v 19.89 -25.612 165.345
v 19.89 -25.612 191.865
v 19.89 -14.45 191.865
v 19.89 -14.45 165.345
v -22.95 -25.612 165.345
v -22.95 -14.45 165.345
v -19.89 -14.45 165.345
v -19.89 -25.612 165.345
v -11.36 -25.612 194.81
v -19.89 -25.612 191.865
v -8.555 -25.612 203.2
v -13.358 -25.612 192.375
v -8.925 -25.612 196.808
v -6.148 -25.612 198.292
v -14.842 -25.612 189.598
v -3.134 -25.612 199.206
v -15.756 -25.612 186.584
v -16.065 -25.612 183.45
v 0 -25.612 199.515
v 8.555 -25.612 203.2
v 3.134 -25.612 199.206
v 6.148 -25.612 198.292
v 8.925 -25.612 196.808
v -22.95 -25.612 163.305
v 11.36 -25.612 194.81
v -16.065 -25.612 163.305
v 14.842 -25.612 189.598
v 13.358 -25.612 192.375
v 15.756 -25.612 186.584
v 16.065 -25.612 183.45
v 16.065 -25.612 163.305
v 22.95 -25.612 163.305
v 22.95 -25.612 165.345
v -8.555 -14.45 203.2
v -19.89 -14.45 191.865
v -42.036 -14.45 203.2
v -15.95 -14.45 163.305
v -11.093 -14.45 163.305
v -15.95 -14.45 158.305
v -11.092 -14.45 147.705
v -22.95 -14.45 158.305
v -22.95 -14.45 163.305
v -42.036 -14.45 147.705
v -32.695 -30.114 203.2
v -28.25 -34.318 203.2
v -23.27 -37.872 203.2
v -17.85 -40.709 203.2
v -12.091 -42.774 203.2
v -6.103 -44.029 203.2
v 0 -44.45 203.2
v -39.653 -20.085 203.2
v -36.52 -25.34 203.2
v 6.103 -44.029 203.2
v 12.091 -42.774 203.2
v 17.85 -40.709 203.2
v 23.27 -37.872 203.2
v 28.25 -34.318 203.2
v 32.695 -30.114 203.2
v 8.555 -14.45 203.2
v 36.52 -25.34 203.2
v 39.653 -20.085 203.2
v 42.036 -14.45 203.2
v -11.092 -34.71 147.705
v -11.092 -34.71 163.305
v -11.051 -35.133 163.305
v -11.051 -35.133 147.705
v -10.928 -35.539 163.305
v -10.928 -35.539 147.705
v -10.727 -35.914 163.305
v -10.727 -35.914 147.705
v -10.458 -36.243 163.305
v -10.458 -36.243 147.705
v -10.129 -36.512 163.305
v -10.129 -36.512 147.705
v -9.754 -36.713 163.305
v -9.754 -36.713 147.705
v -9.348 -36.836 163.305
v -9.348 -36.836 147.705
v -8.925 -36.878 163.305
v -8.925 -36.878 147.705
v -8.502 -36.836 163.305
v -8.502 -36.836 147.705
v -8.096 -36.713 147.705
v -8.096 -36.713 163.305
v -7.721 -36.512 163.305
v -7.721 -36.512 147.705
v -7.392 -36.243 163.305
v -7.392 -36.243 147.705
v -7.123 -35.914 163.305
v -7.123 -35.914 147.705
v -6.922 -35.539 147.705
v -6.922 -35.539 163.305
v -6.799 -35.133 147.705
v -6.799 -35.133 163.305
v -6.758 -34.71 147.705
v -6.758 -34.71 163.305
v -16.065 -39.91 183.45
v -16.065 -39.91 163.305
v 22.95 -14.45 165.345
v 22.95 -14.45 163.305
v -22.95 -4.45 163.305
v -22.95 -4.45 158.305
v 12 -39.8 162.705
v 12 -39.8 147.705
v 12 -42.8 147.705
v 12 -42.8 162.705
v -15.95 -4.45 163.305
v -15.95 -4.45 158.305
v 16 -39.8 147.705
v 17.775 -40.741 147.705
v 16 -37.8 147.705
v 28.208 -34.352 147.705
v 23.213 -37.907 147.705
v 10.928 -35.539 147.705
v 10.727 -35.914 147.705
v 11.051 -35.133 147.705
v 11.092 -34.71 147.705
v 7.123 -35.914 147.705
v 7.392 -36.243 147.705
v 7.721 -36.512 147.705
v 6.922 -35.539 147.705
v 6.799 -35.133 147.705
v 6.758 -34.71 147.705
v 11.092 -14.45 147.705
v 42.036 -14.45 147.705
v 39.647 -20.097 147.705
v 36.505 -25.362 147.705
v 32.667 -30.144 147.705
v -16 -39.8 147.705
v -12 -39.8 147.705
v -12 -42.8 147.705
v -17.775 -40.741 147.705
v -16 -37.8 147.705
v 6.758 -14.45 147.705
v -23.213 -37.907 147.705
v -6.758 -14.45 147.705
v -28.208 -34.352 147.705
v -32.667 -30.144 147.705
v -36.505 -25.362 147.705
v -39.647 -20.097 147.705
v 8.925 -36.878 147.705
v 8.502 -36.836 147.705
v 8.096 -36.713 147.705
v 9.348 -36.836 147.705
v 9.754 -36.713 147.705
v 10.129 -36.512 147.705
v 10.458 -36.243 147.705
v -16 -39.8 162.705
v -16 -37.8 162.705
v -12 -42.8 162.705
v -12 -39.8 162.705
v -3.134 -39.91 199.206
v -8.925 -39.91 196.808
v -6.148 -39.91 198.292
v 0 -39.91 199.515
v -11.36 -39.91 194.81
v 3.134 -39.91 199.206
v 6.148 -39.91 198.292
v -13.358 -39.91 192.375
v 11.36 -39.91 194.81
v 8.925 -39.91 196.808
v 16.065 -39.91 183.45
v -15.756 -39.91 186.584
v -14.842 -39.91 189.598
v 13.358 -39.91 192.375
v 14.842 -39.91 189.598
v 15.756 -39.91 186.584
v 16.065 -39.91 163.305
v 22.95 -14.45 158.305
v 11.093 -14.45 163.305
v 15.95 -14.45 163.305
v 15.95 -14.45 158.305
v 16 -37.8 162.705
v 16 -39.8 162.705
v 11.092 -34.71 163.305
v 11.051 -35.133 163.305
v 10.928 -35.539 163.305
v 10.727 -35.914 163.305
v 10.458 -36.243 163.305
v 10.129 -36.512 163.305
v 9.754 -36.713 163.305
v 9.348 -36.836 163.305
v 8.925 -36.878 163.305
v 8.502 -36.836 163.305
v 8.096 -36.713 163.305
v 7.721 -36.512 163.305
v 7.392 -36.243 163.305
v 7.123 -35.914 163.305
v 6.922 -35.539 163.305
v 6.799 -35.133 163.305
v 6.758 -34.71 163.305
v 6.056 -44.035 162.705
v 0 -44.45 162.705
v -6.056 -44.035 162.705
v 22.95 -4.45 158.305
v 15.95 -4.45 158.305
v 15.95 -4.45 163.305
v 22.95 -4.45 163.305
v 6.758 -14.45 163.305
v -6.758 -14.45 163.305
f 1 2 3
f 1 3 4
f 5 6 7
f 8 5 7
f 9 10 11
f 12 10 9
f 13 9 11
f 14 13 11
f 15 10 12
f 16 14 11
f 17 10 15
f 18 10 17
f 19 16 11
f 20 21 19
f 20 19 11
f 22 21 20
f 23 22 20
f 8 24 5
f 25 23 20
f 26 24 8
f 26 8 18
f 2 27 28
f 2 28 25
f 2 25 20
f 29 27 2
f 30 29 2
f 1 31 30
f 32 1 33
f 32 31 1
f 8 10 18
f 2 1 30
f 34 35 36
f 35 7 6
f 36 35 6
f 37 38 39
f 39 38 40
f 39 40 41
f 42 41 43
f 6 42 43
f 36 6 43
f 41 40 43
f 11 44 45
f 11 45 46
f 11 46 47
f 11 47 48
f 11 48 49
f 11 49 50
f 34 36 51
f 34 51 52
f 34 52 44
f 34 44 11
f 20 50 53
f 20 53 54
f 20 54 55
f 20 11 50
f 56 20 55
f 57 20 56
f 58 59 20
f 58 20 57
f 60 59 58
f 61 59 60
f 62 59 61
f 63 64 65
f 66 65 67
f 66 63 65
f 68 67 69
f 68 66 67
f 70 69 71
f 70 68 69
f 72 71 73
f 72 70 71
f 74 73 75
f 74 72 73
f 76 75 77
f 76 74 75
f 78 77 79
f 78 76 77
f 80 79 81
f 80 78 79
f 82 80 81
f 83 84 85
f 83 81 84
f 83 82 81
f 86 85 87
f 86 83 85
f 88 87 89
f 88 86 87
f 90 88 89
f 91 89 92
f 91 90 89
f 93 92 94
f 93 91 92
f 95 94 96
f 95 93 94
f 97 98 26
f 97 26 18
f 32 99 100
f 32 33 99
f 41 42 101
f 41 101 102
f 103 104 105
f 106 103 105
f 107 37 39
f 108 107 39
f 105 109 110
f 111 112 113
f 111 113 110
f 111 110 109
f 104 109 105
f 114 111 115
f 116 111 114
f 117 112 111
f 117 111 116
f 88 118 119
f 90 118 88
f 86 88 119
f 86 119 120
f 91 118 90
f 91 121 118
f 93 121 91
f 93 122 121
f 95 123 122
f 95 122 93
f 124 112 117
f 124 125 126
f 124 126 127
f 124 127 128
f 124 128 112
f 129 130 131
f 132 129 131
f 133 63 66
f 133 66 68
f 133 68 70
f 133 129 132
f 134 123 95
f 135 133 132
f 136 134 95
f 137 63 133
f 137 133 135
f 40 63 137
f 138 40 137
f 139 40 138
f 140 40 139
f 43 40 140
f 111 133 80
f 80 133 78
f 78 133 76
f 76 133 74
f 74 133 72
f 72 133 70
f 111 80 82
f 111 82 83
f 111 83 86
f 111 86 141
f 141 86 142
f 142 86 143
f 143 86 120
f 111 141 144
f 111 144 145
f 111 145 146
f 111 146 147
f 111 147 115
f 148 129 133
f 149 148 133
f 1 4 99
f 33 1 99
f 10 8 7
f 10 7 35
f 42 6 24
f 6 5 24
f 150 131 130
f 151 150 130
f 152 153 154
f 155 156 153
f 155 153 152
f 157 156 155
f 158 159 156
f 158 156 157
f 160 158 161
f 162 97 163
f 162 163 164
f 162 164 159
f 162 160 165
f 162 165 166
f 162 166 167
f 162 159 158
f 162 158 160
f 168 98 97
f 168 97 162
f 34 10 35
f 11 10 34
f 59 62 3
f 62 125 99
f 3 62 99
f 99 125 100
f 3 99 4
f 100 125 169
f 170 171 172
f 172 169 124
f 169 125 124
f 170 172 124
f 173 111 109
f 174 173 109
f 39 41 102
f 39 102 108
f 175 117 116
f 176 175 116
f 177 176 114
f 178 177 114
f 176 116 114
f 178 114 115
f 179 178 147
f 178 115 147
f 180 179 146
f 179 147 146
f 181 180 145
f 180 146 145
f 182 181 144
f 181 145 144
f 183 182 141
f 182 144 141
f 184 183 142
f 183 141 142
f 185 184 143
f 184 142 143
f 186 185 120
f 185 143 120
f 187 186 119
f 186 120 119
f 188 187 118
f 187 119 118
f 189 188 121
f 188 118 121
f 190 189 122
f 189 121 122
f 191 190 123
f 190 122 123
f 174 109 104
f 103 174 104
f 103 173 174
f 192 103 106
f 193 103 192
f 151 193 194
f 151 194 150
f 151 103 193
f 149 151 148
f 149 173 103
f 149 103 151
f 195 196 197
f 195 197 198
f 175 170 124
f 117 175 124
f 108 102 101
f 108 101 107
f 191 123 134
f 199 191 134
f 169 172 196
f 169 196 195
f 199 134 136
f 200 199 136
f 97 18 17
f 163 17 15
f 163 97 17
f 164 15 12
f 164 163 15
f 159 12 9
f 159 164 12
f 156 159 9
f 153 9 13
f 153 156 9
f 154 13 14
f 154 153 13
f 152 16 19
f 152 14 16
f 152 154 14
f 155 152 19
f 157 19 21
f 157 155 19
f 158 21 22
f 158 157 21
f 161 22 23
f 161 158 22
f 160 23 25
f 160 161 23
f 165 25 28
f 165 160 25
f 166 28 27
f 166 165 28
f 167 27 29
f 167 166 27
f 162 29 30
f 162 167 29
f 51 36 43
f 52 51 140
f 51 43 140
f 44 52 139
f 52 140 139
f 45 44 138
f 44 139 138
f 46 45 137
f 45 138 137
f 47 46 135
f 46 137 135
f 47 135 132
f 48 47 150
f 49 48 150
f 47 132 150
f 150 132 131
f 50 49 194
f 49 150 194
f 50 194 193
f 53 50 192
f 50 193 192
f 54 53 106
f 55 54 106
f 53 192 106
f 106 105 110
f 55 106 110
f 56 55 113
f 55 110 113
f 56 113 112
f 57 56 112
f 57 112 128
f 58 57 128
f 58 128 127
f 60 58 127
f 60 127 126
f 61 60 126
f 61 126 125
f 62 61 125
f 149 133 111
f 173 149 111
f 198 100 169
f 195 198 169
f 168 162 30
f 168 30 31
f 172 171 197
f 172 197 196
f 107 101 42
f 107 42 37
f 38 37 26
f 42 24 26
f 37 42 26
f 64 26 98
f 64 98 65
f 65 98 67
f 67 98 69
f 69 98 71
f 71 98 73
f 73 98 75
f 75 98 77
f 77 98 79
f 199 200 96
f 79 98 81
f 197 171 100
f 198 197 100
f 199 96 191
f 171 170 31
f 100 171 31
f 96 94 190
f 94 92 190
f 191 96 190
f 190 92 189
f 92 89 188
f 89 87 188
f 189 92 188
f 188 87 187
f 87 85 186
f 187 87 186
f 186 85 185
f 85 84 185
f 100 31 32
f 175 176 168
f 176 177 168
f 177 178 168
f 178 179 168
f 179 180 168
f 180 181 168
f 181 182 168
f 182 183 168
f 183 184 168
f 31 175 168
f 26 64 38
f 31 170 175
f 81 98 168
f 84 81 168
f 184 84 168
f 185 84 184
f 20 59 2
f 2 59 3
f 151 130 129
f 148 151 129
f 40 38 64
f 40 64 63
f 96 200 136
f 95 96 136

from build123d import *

# Parameters (mm, degrees)
BOSS_EXTRUDE1_DEPTH = 203.2
CAVITY1_START       = -39.91
CAVITY1_DEPTH       = 23.46
CAVITY1_START_2     = -18.031
CAVITY1_2_OUTLINE_W = 6.885
CAVITY1_2_OUTLINE_H = 2.04
CAVITY1_2_OUTLINE_R = 14.28
CAVITY1_2_DEPTH     = 3.581
CAVITY1_START_3     = -19.612
CAVITY1_3_DEPTH     = 3.162
CAVITY1_START_4     = 132.705
CAVITY1_4_OUTLINE_R = 2.1675
CAVITY1_4_DEPTH     = 32.64
CAVITY1_START_5     = 163.305
CAVITY1_5_DEPTH     = 2.04
CAVITY1_6_OUTLINE_R = 2.1675
CAVITY1_6_DEPTH     = 19.992
CAVITY1_7_OUTLINE_R = 2.1675
CAVITY1_7_DEPTH     = 19.992
CUT_EXTRUDE1_DEPTH  = 210.058488467
CUT_EXTRUDE2_DEPTH  = 209.983650662
SKETCH4_W           = 4.335
SKETCH4_H           = 30.6
CUT_EXTRUDE3_DEPTH  = 209.062749189
CUT_EXTRUDE4_DEPTH  = 132.705
CUT_EXTRUDE5_DEPTH  = 15
CUT_EXTRUDE6_DEPTH  = 6
CUT_EXTRUDE7_REACH  = 84.598
SKETCH8_W           = 7
SKETCH8_H           = 5
BOSS_EXTRUDE2_DEPTH = 10
CUT_EXTRUDE8_DEPTH  = 15


with BuildPart() as part:
    # Sketch1 → Boss-Extrude1 (new body)
    with BuildSketch(Plane.XY):
        with BuildLine():
            Line((42.035699114, -14.45), (-42.035699114, -14.45))
            ThreePointArc((-42.035699114, -14.45), (0, -44.45), (42.035699114, -14.45))
        make_face()
    extrude(amount=BOSS_EXTRUDE1_DEPTH)

    # Cavity1: read off the stored shape, not the designer's step
    # Cavity1 outline → Cavity1 (cut)
    with BuildSketch(Plane(origin=(0, 0, 0), x_dir=(1, 0, 0), z_dir=(0, 1, 0)).offset(CAVITY1_START)):
        with BuildLine():
            Line((16.065, -165.345), (16.065, -163.305))
            Line((16.065, -163.305), (-16.065, -163.305))
            Line((-16.065, -163.305), (-16.065, -165.345))
            Line((-16.065, -165.345), (-16.065, -183.45))
            ThreePointArc((-16.065, -183.45), (0, -199.515), (16.065, -183.45))
            Line((16.065, -183.45), (16.065, -165.345))
        make_face()
    extrude(amount=CAVITY1_DEPTH, mode=Mode.SUBTRACT)

    # Cavity1 2 outline → Cavity1 2 (cut)
    with BuildSketch(Plane(origin=(0, 0, 0), x_dir=(1, 0, 0), z_dir=(0, 1, 0)).offset(CAVITY1_START_2)):
        with Locations((19.5075, -164.325)):
            Rectangle(CAVITY1_2_OUTLINE_W, CAVITY1_2_OUTLINE_H)
        with Locations((-19.5075, -164.325)):
            Rectangle(CAVITY1_2_OUTLINE_W, CAVITY1_2_OUTLINE_H)
        with Locations((0, -183.45)):
            Circle(CAVITY1_2_OUTLINE_R)
    extrude(amount=CAVITY1_2_DEPTH, mode=Mode.SUBTRACT)

    # Cavity1 3 outline → Cavity1 3 (cut)
    with BuildSketch(Plane(origin=(0, 0, 0), x_dir=(1, 0, 0), z_dir=(0, 1, 0)).offset(CAVITY1_START_3)):
        with BuildLine():
            Line((19.89, -163.305), (16.065, -163.305))
            Line((16.065, -163.305), (16.065, -183.45))
            ThreePointArc((16.065, -183.45), (0, -199.515), (-16.065, -183.45))
            Line((-16.065, -183.45), (-16.065, -163.305))
            Line((-16.065, -163.305), (-19.89, -163.305))
            Line((-19.89, -163.305), (-19.89, -191.865))
            Line((-19.89, -191.865), (-8.555, -203.2))
            Line((-8.555, -203.2), (8.555, -203.2))
            Line((8.555, -203.2), (19.89, -191.865))
            Line((19.89, -191.865), (19.89, -163.305))
        make_face()
    extrude(amount=CAVITY1_3_DEPTH, mode=Mode.SUBTRACT)

    # Cavity1 4 outline → Cavity1 4 (cut)
    with BuildSketch(Plane.XY.offset(CAVITY1_START_4)):
        with Locations((8.925, -29.71)):
            Circle(CAVITY1_4_OUTLINE_R)
        with Locations((-8.925, -29.71)):
            Circle(CAVITY1_4_OUTLINE_R)
    extrude(amount=CAVITY1_4_DEPTH, mode=Mode.SUBTRACT)

    # Cavity1 5 outline → Cavity1 5 (cut)
    with BuildSketch(Plane.XY.offset(CAVITY1_START_5)):
        Polygon((9.131481481, -14.45), (7.65, -16.45), (16.065, -16.45), (16.065, -14.45), align=None)
        Polygon((-16.065, -16.45), (-7.65, -16.45), (-9.131481481, -14.45), (-16.065, -14.45), align=None)
    extrude(amount=CAVITY1_5_DEPTH, mode=Mode.SUBTRACT)


with BuildPart() as body_2:
    # Cavity1 6 outline → Cavity1 6 (new body)
    with BuildSketch(Plane.XY.offset(CAVITY1_START_5)):
        with Locations((-8.925, -29.71)):
            Circle(CAVITY1_6_OUTLINE_R)
    extrude(amount=CAVITY1_6_DEPTH)


with BuildPart() as body_3:
    # Cavity1 7 outline → Cavity1 7 (new body)
    with BuildSketch(Plane.XY.offset(CAVITY1_START_5)):
        with Locations((8.925, -29.71)):
            Circle(CAVITY1_7_OUTLINE_R)
    extrude(amount=CAVITY1_7_DEPTH)


with BuildPart() as cut_extrude1_tool:
    # Sketch2 → Cut-Extrude1 (new, through all)
    with BuildSketch(Plane(origin=(0, -39.91, 0), x_dir=(1, 0, 0), z_dir=(0, 1, 0))):
        with BuildLine():
            Line((16.065, -183.45), (16.065, -163.305))
            Line((16.065, -163.305), (-16.065, -163.305))
            Line((-16.065, -163.305), (-16.065, -183.45))
            ThreePointArc((-16.065, -183.45), (0, -199.515), (16.065, -183.45))
        make_face()
    extrude(amount=CUT_EXTRUDE1_DEPTH)


with BuildPart() as part_1:
    add(part.part)

    # Cut-Extrude1: cut by cut_extrude1_tool
    add(cut_extrude1_tool.part, mode=Mode.SUBTRACT)

    # Sketch3 → Cut-Extrude2 (cut, through all)
    with BuildSketch(Plane(origin=(0, -19.612, 0), x_dir=(1, 0, 0), z_dir=(0, 1, 0))):
        with BuildLine():
            Line((-8.555, -203.2), (8.555, -203.2))
            Line((8.555, -203.2), (19.89, -191.865))
            Line((19.89, -191.865), (19.89, -163.305))
            Line((19.89, -163.305), (16.065, -163.305))
            Line((16.065, -163.305), (16.065, -183.45))
            ThreePointArc((16.065, -183.45), (0, -199.515), (-16.065, -183.45))
            Line((-16.065, -183.45), (-16.065, -163.305))
            Line((-16.065, -163.305), (-19.89, -163.305))
            Line((-19.89, -163.305), (-19.89, -191.865))
            Line((-19.89, -191.865), (-8.555, -203.2))
        make_face()
    extrude(amount=CUT_EXTRUDE2_DEPTH, mode=Mode.SUBTRACT)

    # Sketch4 → Cut-Extrude3 (cut, through all)
    with BuildSketch(Plane(origin=(0, -29.71, 0), x_dir=(1, 0, 0), z_dir=(0, 1, 0))):
        with Locations((-8.925, -148.005)):
            Rectangle(SKETCH4_W, SKETCH4_H)
        with Locations((8.925, -148.005)):
            Rectangle(SKETCH4_W, SKETCH4_H)
    extrude(amount=CUT_EXTRUDE3_DEPTH, mode=Mode.SUBTRACT)

    # Sketch1<3> → Cut-Extrude4 (cut)
    with BuildSketch(Plane.XY):
        with BuildLine():
            ThreePointArc((44.45, 0), (-7.325151001, 43.842270274), (-42.035699114, -14.45))
            Line((-42.035699114, -14.45), (42.035699114, -14.45))
            ThreePointArc((42.035699114, -14.45), (43.842270274, -7.325151001), (44.45, 0))
        make_face()
        with BuildLine():
            Line((42.035699114, -14.45), (-42.035699114, -14.45))
            ThreePointArc((-42.035699114, -14.45), (0, -44.45), (42.035699114, -14.45))
        make_face()
    extrude(amount=CUT_EXTRUDE4_DEPTH, mode=Mode.SUBTRACT)

    # Sketch5 → Cut-Extrude5 (cut)
    with BuildSketch(Plane(origin=(0, 0, 132.705), x_dir=(-1, 0, 0), z_dir=(0, 0, -1))):
        with BuildLine():
            Line((6.7575, -29.71), (6.7575, -14.45))
            Line((6.7575, -14.45), (-6.7575, -14.45))
            Line((-6.7575, -14.45), (-6.7575, -29.71))
            ThreePointArc((-6.7575, -29.71), (-8.925, -31.8775), (-11.0925, -29.71))
            Line((-11.0925, -29.71), (-11.0925, -14.45))
            Line((-11.0925, -14.45), (-42.035699114, -14.45))
            ThreePointArc((-42.035699114, -14.45), (0, -44.45), (42.035699114, -14.45))
            Line((42.035699114, -14.45), (11.0925, -14.45))
            Line((11.0925, -14.45), (11.0925, -29.71))
            ThreePointArc((11.0925, -29.71), (8.925, -31.8775), (6.7575, -29.71))
        make_face()
    extrude(amount=-CUT_EXTRUDE5_DEPTH, mode=Mode.SUBTRACT)

    # Sketch6 → Cut-Extrude6 (cut, symmetric)
    with BuildSketch(Plane(origin=(0, -19.612, 0), x_dir=(1, 0, 0), z_dir=(0, 1, 0))):
        with BuildLine():
            Line((-16.065, -163.305), (-22.95, -163.305))
            Line((-22.95, -163.305), (-22.95, -165.345))
            Line((-22.95, -165.345), (-19.89, -165.345))
            Line((-19.89, -165.345), (-19.89, -191.865))
            Line((-19.89, -191.865), (-8.555, -203.2))
            Line((-8.555, -203.2), (8.555, -203.2))
            Line((8.555, -203.2), (19.89, -191.865))
            Line((19.89, -191.865), (19.89, -165.345))
            Line((19.89, -165.345), (22.95, -165.345))
            Line((22.95, -165.345), (22.95, -163.305))
            Line((22.95, -163.305), (16.065, -163.305))
            Line((16.065, -163.305), (16.065, -183.45))
            ThreePointArc((16.065, -183.45), (0, -199.515), (-16.065, -183.45))
            Line((-16.065, -183.45), (-16.065, -163.305))
        make_face()
    extrude(amount=CUT_EXTRUDE6_DEPTH, both=True, mode=Mode.SUBTRACT)

    # Sketch7 → Cut-Extrude7 (cut, up to next)
    with BuildSketch(Plane(origin=(0, 0, 147.705), x_dir=(-1, 0, 0), z_dir=(0, 0, -1)), mode=Mode.PRIVATE) as cut_extrude7_sk1:
        with BuildLine():
            Line((-11.0925, -29.71), (-11.0925, -34.71))
            ThreePointArc((-11.0925, -34.71), (-8.925, -36.8775), (-6.7575, -34.71))
            Line((-6.7575, -34.71), (-6.7575, -29.71))
            Line((-6.7575, -29.71), (-11.0925, -29.71))
        make_face()
    cut_extrude7_tool1 = extrude(cut_extrude7_sk1.sketch, amount=-CUT_EXTRUDE7_REACH, mode=Mode.PRIVATE) & part_1.part
    # Sketch7 → Cut-Extrude7 (cut, up to next)
    with BuildSketch(Plane(origin=(0, 0, 147.705), x_dir=(-1, 0, 0), z_dir=(0, 0, -1)), mode=Mode.PRIVATE) as cut_extrude7_sk2:
        with BuildLine():
            Line((11.0925, -29.71), (11.0925, -34.71))
            ThreePointArc((11.0925, -34.71), (8.925, -36.8775), (6.7575, -34.71))
            Line((6.7575, -34.71), (6.7575, -29.71))
            Line((6.7575, -29.71), (11.0925, -29.71))
        make_face()
    cut_extrude7_tool2 = extrude(cut_extrude7_sk2.sketch, amount=-CUT_EXTRUDE7_REACH, mode=Mode.PRIVATE) & part_1.part
    add(cut_extrude7_tool1.solids().sort_by_distance((8.925, -33.078635, 147.705))[0], mode=Mode.SUBTRACT)
    add(cut_extrude7_tool2.solids().sort_by_distance((-8.925, -33.078635, 147.705))[0], mode=Mode.SUBTRACT)

    # Sketch8 → Boss-Extrude2 (add)
    with BuildSketch(Plane(origin=(0, -14.45, 0), x_dir=(1, 0, 0), z_dir=(0, 1, 0))):
        with Locations((-19.45, -160.805)):
            Rectangle(SKETCH8_W, SKETCH8_H)
        with Locations((19.45, -160.805)):
            Rectangle(SKETCH8_W, SKETCH8_H)
    extrude(amount=BOSS_EXTRUDE2_DEPTH)

    # Sketch9 → Cut-Extrude8 (cut)
    with BuildSketch(Plane(origin=(0, 0, 147.705), x_dir=(-1, 0, 0), z_dir=(0, 0, -1))):
        with BuildLine():
            Line((-12, -39.799561914), (-12, -42.799561914))
            ThreePointArc((-12, -42.799561914), (0, -44.45), (12, -42.799561914))
            Line((12, -42.799561914), (12, -39.799561914))
            Line((12, -39.799561914), (16, -39.799561914))
            Line((16, -39.799561914), (16, -37.799561914))
            Line((16, -37.799561914), (-16, -37.799561914))
            Line((-16, -37.799561914), (-16, -39.799561914))
            Line((-16, -39.799561914), (-12, -39.799561914))
        make_face()
    extrude(amount=-CUT_EXTRUDE8_DEPTH, mode=Mode.SUBTRACT)


with BuildPart() as body_2_1:
    add(body_2.part)

    # Cut-Extrude1: cut by cut_extrude1_tool
    add(cut_extrude1_tool.part, mode=Mode.SUBTRACT)


with BuildPart() as body_3_1:
    add(body_3.part)

    # Cut-Extrude1: cut by cut_extrude1_tool
    add(cut_extrude1_tool.part, mode=Mode.SUBTRACT)


solid = part_1.part
